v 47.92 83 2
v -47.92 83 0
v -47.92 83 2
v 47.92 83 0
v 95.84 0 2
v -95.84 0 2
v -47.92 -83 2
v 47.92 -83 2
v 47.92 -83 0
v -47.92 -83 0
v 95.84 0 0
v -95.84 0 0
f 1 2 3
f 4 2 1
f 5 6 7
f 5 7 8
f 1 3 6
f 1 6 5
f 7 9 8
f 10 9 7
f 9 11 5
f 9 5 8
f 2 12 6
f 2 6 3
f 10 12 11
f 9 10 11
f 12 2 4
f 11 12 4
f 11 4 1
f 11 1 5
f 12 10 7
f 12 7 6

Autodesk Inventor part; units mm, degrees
ref_plane "YZ Plane" through (0, 0, 0) normal (1, 0, 0) x (0, 1, 0)
ref_plane "XZ Plane" through (0, 0, 0) normal (0, 1, 0) x (-1, 0, 0)
ref_plane "XY Plane" through (0, 0, 0) normal (0, 0, 1) x (1, 0, 0)
sketch "Sketch1" plane through (0, 0, 0) normal (0, 0, 1) x (1, 0, 0)
  line L0 (-47.9201, 83) -> (47.9201, 83)
  line L1 (47.9201, 83) -> (95.8401, 0)
  line L2 (95.8401, 0) -> (47.9201, -83)
  line L3 (47.9201, -83) -> (-47.9201, -83)
  line L4 (-47.9201, -83) -> (-95.8401, 0)
  line L5 (-95.8401, 0) -> (-47.9201, 83)
  point P0 (0, 0)
  point P1 (0, 0)
  dimension "d0" = 166
extrude "Extrusion1" add sketch "Sketch1" along normal blind 2
sketch "Sketch3" plane through (0, 0, 2) normal (0, 0, 1) x (1, 0, 0)
  line L0 (47.9201, 83) -> (-47.9201, 83) projected
  line L1 (-47.9201, 83) -> (-95.8401, 0) projected
  line L2 (-95.8401, 0) -> (-47.9201, -83) projected
  line L3 (-47.9201, -83) -> (47.9201, -83) projected
  line L4 (47.9201, -83) -> (95.8401, 0) projected
  line L5 (95.8401, 0) -> (47.9201, 83) projected
  line L6 (-95.8401, 83) -> (95.8401, 83)
  line L7 (95.8401, 83) -> (95.8401, -83)
  line L8 (95.8401, -83) -> (-95.8401, -83)
  line L9 (-95.8401, -83) -> (-95.8401, 83)
  line L10 (-95.8401, 83) -> (95.8401, -83) construction
  line L11 (95.8401, 83) -> (-95.8401, -83) construction
  point P0 (0, 0)
  dimension "d3" = 191.6803
  dimension "d4" = 166
properties part number "Frosted Top v1"
